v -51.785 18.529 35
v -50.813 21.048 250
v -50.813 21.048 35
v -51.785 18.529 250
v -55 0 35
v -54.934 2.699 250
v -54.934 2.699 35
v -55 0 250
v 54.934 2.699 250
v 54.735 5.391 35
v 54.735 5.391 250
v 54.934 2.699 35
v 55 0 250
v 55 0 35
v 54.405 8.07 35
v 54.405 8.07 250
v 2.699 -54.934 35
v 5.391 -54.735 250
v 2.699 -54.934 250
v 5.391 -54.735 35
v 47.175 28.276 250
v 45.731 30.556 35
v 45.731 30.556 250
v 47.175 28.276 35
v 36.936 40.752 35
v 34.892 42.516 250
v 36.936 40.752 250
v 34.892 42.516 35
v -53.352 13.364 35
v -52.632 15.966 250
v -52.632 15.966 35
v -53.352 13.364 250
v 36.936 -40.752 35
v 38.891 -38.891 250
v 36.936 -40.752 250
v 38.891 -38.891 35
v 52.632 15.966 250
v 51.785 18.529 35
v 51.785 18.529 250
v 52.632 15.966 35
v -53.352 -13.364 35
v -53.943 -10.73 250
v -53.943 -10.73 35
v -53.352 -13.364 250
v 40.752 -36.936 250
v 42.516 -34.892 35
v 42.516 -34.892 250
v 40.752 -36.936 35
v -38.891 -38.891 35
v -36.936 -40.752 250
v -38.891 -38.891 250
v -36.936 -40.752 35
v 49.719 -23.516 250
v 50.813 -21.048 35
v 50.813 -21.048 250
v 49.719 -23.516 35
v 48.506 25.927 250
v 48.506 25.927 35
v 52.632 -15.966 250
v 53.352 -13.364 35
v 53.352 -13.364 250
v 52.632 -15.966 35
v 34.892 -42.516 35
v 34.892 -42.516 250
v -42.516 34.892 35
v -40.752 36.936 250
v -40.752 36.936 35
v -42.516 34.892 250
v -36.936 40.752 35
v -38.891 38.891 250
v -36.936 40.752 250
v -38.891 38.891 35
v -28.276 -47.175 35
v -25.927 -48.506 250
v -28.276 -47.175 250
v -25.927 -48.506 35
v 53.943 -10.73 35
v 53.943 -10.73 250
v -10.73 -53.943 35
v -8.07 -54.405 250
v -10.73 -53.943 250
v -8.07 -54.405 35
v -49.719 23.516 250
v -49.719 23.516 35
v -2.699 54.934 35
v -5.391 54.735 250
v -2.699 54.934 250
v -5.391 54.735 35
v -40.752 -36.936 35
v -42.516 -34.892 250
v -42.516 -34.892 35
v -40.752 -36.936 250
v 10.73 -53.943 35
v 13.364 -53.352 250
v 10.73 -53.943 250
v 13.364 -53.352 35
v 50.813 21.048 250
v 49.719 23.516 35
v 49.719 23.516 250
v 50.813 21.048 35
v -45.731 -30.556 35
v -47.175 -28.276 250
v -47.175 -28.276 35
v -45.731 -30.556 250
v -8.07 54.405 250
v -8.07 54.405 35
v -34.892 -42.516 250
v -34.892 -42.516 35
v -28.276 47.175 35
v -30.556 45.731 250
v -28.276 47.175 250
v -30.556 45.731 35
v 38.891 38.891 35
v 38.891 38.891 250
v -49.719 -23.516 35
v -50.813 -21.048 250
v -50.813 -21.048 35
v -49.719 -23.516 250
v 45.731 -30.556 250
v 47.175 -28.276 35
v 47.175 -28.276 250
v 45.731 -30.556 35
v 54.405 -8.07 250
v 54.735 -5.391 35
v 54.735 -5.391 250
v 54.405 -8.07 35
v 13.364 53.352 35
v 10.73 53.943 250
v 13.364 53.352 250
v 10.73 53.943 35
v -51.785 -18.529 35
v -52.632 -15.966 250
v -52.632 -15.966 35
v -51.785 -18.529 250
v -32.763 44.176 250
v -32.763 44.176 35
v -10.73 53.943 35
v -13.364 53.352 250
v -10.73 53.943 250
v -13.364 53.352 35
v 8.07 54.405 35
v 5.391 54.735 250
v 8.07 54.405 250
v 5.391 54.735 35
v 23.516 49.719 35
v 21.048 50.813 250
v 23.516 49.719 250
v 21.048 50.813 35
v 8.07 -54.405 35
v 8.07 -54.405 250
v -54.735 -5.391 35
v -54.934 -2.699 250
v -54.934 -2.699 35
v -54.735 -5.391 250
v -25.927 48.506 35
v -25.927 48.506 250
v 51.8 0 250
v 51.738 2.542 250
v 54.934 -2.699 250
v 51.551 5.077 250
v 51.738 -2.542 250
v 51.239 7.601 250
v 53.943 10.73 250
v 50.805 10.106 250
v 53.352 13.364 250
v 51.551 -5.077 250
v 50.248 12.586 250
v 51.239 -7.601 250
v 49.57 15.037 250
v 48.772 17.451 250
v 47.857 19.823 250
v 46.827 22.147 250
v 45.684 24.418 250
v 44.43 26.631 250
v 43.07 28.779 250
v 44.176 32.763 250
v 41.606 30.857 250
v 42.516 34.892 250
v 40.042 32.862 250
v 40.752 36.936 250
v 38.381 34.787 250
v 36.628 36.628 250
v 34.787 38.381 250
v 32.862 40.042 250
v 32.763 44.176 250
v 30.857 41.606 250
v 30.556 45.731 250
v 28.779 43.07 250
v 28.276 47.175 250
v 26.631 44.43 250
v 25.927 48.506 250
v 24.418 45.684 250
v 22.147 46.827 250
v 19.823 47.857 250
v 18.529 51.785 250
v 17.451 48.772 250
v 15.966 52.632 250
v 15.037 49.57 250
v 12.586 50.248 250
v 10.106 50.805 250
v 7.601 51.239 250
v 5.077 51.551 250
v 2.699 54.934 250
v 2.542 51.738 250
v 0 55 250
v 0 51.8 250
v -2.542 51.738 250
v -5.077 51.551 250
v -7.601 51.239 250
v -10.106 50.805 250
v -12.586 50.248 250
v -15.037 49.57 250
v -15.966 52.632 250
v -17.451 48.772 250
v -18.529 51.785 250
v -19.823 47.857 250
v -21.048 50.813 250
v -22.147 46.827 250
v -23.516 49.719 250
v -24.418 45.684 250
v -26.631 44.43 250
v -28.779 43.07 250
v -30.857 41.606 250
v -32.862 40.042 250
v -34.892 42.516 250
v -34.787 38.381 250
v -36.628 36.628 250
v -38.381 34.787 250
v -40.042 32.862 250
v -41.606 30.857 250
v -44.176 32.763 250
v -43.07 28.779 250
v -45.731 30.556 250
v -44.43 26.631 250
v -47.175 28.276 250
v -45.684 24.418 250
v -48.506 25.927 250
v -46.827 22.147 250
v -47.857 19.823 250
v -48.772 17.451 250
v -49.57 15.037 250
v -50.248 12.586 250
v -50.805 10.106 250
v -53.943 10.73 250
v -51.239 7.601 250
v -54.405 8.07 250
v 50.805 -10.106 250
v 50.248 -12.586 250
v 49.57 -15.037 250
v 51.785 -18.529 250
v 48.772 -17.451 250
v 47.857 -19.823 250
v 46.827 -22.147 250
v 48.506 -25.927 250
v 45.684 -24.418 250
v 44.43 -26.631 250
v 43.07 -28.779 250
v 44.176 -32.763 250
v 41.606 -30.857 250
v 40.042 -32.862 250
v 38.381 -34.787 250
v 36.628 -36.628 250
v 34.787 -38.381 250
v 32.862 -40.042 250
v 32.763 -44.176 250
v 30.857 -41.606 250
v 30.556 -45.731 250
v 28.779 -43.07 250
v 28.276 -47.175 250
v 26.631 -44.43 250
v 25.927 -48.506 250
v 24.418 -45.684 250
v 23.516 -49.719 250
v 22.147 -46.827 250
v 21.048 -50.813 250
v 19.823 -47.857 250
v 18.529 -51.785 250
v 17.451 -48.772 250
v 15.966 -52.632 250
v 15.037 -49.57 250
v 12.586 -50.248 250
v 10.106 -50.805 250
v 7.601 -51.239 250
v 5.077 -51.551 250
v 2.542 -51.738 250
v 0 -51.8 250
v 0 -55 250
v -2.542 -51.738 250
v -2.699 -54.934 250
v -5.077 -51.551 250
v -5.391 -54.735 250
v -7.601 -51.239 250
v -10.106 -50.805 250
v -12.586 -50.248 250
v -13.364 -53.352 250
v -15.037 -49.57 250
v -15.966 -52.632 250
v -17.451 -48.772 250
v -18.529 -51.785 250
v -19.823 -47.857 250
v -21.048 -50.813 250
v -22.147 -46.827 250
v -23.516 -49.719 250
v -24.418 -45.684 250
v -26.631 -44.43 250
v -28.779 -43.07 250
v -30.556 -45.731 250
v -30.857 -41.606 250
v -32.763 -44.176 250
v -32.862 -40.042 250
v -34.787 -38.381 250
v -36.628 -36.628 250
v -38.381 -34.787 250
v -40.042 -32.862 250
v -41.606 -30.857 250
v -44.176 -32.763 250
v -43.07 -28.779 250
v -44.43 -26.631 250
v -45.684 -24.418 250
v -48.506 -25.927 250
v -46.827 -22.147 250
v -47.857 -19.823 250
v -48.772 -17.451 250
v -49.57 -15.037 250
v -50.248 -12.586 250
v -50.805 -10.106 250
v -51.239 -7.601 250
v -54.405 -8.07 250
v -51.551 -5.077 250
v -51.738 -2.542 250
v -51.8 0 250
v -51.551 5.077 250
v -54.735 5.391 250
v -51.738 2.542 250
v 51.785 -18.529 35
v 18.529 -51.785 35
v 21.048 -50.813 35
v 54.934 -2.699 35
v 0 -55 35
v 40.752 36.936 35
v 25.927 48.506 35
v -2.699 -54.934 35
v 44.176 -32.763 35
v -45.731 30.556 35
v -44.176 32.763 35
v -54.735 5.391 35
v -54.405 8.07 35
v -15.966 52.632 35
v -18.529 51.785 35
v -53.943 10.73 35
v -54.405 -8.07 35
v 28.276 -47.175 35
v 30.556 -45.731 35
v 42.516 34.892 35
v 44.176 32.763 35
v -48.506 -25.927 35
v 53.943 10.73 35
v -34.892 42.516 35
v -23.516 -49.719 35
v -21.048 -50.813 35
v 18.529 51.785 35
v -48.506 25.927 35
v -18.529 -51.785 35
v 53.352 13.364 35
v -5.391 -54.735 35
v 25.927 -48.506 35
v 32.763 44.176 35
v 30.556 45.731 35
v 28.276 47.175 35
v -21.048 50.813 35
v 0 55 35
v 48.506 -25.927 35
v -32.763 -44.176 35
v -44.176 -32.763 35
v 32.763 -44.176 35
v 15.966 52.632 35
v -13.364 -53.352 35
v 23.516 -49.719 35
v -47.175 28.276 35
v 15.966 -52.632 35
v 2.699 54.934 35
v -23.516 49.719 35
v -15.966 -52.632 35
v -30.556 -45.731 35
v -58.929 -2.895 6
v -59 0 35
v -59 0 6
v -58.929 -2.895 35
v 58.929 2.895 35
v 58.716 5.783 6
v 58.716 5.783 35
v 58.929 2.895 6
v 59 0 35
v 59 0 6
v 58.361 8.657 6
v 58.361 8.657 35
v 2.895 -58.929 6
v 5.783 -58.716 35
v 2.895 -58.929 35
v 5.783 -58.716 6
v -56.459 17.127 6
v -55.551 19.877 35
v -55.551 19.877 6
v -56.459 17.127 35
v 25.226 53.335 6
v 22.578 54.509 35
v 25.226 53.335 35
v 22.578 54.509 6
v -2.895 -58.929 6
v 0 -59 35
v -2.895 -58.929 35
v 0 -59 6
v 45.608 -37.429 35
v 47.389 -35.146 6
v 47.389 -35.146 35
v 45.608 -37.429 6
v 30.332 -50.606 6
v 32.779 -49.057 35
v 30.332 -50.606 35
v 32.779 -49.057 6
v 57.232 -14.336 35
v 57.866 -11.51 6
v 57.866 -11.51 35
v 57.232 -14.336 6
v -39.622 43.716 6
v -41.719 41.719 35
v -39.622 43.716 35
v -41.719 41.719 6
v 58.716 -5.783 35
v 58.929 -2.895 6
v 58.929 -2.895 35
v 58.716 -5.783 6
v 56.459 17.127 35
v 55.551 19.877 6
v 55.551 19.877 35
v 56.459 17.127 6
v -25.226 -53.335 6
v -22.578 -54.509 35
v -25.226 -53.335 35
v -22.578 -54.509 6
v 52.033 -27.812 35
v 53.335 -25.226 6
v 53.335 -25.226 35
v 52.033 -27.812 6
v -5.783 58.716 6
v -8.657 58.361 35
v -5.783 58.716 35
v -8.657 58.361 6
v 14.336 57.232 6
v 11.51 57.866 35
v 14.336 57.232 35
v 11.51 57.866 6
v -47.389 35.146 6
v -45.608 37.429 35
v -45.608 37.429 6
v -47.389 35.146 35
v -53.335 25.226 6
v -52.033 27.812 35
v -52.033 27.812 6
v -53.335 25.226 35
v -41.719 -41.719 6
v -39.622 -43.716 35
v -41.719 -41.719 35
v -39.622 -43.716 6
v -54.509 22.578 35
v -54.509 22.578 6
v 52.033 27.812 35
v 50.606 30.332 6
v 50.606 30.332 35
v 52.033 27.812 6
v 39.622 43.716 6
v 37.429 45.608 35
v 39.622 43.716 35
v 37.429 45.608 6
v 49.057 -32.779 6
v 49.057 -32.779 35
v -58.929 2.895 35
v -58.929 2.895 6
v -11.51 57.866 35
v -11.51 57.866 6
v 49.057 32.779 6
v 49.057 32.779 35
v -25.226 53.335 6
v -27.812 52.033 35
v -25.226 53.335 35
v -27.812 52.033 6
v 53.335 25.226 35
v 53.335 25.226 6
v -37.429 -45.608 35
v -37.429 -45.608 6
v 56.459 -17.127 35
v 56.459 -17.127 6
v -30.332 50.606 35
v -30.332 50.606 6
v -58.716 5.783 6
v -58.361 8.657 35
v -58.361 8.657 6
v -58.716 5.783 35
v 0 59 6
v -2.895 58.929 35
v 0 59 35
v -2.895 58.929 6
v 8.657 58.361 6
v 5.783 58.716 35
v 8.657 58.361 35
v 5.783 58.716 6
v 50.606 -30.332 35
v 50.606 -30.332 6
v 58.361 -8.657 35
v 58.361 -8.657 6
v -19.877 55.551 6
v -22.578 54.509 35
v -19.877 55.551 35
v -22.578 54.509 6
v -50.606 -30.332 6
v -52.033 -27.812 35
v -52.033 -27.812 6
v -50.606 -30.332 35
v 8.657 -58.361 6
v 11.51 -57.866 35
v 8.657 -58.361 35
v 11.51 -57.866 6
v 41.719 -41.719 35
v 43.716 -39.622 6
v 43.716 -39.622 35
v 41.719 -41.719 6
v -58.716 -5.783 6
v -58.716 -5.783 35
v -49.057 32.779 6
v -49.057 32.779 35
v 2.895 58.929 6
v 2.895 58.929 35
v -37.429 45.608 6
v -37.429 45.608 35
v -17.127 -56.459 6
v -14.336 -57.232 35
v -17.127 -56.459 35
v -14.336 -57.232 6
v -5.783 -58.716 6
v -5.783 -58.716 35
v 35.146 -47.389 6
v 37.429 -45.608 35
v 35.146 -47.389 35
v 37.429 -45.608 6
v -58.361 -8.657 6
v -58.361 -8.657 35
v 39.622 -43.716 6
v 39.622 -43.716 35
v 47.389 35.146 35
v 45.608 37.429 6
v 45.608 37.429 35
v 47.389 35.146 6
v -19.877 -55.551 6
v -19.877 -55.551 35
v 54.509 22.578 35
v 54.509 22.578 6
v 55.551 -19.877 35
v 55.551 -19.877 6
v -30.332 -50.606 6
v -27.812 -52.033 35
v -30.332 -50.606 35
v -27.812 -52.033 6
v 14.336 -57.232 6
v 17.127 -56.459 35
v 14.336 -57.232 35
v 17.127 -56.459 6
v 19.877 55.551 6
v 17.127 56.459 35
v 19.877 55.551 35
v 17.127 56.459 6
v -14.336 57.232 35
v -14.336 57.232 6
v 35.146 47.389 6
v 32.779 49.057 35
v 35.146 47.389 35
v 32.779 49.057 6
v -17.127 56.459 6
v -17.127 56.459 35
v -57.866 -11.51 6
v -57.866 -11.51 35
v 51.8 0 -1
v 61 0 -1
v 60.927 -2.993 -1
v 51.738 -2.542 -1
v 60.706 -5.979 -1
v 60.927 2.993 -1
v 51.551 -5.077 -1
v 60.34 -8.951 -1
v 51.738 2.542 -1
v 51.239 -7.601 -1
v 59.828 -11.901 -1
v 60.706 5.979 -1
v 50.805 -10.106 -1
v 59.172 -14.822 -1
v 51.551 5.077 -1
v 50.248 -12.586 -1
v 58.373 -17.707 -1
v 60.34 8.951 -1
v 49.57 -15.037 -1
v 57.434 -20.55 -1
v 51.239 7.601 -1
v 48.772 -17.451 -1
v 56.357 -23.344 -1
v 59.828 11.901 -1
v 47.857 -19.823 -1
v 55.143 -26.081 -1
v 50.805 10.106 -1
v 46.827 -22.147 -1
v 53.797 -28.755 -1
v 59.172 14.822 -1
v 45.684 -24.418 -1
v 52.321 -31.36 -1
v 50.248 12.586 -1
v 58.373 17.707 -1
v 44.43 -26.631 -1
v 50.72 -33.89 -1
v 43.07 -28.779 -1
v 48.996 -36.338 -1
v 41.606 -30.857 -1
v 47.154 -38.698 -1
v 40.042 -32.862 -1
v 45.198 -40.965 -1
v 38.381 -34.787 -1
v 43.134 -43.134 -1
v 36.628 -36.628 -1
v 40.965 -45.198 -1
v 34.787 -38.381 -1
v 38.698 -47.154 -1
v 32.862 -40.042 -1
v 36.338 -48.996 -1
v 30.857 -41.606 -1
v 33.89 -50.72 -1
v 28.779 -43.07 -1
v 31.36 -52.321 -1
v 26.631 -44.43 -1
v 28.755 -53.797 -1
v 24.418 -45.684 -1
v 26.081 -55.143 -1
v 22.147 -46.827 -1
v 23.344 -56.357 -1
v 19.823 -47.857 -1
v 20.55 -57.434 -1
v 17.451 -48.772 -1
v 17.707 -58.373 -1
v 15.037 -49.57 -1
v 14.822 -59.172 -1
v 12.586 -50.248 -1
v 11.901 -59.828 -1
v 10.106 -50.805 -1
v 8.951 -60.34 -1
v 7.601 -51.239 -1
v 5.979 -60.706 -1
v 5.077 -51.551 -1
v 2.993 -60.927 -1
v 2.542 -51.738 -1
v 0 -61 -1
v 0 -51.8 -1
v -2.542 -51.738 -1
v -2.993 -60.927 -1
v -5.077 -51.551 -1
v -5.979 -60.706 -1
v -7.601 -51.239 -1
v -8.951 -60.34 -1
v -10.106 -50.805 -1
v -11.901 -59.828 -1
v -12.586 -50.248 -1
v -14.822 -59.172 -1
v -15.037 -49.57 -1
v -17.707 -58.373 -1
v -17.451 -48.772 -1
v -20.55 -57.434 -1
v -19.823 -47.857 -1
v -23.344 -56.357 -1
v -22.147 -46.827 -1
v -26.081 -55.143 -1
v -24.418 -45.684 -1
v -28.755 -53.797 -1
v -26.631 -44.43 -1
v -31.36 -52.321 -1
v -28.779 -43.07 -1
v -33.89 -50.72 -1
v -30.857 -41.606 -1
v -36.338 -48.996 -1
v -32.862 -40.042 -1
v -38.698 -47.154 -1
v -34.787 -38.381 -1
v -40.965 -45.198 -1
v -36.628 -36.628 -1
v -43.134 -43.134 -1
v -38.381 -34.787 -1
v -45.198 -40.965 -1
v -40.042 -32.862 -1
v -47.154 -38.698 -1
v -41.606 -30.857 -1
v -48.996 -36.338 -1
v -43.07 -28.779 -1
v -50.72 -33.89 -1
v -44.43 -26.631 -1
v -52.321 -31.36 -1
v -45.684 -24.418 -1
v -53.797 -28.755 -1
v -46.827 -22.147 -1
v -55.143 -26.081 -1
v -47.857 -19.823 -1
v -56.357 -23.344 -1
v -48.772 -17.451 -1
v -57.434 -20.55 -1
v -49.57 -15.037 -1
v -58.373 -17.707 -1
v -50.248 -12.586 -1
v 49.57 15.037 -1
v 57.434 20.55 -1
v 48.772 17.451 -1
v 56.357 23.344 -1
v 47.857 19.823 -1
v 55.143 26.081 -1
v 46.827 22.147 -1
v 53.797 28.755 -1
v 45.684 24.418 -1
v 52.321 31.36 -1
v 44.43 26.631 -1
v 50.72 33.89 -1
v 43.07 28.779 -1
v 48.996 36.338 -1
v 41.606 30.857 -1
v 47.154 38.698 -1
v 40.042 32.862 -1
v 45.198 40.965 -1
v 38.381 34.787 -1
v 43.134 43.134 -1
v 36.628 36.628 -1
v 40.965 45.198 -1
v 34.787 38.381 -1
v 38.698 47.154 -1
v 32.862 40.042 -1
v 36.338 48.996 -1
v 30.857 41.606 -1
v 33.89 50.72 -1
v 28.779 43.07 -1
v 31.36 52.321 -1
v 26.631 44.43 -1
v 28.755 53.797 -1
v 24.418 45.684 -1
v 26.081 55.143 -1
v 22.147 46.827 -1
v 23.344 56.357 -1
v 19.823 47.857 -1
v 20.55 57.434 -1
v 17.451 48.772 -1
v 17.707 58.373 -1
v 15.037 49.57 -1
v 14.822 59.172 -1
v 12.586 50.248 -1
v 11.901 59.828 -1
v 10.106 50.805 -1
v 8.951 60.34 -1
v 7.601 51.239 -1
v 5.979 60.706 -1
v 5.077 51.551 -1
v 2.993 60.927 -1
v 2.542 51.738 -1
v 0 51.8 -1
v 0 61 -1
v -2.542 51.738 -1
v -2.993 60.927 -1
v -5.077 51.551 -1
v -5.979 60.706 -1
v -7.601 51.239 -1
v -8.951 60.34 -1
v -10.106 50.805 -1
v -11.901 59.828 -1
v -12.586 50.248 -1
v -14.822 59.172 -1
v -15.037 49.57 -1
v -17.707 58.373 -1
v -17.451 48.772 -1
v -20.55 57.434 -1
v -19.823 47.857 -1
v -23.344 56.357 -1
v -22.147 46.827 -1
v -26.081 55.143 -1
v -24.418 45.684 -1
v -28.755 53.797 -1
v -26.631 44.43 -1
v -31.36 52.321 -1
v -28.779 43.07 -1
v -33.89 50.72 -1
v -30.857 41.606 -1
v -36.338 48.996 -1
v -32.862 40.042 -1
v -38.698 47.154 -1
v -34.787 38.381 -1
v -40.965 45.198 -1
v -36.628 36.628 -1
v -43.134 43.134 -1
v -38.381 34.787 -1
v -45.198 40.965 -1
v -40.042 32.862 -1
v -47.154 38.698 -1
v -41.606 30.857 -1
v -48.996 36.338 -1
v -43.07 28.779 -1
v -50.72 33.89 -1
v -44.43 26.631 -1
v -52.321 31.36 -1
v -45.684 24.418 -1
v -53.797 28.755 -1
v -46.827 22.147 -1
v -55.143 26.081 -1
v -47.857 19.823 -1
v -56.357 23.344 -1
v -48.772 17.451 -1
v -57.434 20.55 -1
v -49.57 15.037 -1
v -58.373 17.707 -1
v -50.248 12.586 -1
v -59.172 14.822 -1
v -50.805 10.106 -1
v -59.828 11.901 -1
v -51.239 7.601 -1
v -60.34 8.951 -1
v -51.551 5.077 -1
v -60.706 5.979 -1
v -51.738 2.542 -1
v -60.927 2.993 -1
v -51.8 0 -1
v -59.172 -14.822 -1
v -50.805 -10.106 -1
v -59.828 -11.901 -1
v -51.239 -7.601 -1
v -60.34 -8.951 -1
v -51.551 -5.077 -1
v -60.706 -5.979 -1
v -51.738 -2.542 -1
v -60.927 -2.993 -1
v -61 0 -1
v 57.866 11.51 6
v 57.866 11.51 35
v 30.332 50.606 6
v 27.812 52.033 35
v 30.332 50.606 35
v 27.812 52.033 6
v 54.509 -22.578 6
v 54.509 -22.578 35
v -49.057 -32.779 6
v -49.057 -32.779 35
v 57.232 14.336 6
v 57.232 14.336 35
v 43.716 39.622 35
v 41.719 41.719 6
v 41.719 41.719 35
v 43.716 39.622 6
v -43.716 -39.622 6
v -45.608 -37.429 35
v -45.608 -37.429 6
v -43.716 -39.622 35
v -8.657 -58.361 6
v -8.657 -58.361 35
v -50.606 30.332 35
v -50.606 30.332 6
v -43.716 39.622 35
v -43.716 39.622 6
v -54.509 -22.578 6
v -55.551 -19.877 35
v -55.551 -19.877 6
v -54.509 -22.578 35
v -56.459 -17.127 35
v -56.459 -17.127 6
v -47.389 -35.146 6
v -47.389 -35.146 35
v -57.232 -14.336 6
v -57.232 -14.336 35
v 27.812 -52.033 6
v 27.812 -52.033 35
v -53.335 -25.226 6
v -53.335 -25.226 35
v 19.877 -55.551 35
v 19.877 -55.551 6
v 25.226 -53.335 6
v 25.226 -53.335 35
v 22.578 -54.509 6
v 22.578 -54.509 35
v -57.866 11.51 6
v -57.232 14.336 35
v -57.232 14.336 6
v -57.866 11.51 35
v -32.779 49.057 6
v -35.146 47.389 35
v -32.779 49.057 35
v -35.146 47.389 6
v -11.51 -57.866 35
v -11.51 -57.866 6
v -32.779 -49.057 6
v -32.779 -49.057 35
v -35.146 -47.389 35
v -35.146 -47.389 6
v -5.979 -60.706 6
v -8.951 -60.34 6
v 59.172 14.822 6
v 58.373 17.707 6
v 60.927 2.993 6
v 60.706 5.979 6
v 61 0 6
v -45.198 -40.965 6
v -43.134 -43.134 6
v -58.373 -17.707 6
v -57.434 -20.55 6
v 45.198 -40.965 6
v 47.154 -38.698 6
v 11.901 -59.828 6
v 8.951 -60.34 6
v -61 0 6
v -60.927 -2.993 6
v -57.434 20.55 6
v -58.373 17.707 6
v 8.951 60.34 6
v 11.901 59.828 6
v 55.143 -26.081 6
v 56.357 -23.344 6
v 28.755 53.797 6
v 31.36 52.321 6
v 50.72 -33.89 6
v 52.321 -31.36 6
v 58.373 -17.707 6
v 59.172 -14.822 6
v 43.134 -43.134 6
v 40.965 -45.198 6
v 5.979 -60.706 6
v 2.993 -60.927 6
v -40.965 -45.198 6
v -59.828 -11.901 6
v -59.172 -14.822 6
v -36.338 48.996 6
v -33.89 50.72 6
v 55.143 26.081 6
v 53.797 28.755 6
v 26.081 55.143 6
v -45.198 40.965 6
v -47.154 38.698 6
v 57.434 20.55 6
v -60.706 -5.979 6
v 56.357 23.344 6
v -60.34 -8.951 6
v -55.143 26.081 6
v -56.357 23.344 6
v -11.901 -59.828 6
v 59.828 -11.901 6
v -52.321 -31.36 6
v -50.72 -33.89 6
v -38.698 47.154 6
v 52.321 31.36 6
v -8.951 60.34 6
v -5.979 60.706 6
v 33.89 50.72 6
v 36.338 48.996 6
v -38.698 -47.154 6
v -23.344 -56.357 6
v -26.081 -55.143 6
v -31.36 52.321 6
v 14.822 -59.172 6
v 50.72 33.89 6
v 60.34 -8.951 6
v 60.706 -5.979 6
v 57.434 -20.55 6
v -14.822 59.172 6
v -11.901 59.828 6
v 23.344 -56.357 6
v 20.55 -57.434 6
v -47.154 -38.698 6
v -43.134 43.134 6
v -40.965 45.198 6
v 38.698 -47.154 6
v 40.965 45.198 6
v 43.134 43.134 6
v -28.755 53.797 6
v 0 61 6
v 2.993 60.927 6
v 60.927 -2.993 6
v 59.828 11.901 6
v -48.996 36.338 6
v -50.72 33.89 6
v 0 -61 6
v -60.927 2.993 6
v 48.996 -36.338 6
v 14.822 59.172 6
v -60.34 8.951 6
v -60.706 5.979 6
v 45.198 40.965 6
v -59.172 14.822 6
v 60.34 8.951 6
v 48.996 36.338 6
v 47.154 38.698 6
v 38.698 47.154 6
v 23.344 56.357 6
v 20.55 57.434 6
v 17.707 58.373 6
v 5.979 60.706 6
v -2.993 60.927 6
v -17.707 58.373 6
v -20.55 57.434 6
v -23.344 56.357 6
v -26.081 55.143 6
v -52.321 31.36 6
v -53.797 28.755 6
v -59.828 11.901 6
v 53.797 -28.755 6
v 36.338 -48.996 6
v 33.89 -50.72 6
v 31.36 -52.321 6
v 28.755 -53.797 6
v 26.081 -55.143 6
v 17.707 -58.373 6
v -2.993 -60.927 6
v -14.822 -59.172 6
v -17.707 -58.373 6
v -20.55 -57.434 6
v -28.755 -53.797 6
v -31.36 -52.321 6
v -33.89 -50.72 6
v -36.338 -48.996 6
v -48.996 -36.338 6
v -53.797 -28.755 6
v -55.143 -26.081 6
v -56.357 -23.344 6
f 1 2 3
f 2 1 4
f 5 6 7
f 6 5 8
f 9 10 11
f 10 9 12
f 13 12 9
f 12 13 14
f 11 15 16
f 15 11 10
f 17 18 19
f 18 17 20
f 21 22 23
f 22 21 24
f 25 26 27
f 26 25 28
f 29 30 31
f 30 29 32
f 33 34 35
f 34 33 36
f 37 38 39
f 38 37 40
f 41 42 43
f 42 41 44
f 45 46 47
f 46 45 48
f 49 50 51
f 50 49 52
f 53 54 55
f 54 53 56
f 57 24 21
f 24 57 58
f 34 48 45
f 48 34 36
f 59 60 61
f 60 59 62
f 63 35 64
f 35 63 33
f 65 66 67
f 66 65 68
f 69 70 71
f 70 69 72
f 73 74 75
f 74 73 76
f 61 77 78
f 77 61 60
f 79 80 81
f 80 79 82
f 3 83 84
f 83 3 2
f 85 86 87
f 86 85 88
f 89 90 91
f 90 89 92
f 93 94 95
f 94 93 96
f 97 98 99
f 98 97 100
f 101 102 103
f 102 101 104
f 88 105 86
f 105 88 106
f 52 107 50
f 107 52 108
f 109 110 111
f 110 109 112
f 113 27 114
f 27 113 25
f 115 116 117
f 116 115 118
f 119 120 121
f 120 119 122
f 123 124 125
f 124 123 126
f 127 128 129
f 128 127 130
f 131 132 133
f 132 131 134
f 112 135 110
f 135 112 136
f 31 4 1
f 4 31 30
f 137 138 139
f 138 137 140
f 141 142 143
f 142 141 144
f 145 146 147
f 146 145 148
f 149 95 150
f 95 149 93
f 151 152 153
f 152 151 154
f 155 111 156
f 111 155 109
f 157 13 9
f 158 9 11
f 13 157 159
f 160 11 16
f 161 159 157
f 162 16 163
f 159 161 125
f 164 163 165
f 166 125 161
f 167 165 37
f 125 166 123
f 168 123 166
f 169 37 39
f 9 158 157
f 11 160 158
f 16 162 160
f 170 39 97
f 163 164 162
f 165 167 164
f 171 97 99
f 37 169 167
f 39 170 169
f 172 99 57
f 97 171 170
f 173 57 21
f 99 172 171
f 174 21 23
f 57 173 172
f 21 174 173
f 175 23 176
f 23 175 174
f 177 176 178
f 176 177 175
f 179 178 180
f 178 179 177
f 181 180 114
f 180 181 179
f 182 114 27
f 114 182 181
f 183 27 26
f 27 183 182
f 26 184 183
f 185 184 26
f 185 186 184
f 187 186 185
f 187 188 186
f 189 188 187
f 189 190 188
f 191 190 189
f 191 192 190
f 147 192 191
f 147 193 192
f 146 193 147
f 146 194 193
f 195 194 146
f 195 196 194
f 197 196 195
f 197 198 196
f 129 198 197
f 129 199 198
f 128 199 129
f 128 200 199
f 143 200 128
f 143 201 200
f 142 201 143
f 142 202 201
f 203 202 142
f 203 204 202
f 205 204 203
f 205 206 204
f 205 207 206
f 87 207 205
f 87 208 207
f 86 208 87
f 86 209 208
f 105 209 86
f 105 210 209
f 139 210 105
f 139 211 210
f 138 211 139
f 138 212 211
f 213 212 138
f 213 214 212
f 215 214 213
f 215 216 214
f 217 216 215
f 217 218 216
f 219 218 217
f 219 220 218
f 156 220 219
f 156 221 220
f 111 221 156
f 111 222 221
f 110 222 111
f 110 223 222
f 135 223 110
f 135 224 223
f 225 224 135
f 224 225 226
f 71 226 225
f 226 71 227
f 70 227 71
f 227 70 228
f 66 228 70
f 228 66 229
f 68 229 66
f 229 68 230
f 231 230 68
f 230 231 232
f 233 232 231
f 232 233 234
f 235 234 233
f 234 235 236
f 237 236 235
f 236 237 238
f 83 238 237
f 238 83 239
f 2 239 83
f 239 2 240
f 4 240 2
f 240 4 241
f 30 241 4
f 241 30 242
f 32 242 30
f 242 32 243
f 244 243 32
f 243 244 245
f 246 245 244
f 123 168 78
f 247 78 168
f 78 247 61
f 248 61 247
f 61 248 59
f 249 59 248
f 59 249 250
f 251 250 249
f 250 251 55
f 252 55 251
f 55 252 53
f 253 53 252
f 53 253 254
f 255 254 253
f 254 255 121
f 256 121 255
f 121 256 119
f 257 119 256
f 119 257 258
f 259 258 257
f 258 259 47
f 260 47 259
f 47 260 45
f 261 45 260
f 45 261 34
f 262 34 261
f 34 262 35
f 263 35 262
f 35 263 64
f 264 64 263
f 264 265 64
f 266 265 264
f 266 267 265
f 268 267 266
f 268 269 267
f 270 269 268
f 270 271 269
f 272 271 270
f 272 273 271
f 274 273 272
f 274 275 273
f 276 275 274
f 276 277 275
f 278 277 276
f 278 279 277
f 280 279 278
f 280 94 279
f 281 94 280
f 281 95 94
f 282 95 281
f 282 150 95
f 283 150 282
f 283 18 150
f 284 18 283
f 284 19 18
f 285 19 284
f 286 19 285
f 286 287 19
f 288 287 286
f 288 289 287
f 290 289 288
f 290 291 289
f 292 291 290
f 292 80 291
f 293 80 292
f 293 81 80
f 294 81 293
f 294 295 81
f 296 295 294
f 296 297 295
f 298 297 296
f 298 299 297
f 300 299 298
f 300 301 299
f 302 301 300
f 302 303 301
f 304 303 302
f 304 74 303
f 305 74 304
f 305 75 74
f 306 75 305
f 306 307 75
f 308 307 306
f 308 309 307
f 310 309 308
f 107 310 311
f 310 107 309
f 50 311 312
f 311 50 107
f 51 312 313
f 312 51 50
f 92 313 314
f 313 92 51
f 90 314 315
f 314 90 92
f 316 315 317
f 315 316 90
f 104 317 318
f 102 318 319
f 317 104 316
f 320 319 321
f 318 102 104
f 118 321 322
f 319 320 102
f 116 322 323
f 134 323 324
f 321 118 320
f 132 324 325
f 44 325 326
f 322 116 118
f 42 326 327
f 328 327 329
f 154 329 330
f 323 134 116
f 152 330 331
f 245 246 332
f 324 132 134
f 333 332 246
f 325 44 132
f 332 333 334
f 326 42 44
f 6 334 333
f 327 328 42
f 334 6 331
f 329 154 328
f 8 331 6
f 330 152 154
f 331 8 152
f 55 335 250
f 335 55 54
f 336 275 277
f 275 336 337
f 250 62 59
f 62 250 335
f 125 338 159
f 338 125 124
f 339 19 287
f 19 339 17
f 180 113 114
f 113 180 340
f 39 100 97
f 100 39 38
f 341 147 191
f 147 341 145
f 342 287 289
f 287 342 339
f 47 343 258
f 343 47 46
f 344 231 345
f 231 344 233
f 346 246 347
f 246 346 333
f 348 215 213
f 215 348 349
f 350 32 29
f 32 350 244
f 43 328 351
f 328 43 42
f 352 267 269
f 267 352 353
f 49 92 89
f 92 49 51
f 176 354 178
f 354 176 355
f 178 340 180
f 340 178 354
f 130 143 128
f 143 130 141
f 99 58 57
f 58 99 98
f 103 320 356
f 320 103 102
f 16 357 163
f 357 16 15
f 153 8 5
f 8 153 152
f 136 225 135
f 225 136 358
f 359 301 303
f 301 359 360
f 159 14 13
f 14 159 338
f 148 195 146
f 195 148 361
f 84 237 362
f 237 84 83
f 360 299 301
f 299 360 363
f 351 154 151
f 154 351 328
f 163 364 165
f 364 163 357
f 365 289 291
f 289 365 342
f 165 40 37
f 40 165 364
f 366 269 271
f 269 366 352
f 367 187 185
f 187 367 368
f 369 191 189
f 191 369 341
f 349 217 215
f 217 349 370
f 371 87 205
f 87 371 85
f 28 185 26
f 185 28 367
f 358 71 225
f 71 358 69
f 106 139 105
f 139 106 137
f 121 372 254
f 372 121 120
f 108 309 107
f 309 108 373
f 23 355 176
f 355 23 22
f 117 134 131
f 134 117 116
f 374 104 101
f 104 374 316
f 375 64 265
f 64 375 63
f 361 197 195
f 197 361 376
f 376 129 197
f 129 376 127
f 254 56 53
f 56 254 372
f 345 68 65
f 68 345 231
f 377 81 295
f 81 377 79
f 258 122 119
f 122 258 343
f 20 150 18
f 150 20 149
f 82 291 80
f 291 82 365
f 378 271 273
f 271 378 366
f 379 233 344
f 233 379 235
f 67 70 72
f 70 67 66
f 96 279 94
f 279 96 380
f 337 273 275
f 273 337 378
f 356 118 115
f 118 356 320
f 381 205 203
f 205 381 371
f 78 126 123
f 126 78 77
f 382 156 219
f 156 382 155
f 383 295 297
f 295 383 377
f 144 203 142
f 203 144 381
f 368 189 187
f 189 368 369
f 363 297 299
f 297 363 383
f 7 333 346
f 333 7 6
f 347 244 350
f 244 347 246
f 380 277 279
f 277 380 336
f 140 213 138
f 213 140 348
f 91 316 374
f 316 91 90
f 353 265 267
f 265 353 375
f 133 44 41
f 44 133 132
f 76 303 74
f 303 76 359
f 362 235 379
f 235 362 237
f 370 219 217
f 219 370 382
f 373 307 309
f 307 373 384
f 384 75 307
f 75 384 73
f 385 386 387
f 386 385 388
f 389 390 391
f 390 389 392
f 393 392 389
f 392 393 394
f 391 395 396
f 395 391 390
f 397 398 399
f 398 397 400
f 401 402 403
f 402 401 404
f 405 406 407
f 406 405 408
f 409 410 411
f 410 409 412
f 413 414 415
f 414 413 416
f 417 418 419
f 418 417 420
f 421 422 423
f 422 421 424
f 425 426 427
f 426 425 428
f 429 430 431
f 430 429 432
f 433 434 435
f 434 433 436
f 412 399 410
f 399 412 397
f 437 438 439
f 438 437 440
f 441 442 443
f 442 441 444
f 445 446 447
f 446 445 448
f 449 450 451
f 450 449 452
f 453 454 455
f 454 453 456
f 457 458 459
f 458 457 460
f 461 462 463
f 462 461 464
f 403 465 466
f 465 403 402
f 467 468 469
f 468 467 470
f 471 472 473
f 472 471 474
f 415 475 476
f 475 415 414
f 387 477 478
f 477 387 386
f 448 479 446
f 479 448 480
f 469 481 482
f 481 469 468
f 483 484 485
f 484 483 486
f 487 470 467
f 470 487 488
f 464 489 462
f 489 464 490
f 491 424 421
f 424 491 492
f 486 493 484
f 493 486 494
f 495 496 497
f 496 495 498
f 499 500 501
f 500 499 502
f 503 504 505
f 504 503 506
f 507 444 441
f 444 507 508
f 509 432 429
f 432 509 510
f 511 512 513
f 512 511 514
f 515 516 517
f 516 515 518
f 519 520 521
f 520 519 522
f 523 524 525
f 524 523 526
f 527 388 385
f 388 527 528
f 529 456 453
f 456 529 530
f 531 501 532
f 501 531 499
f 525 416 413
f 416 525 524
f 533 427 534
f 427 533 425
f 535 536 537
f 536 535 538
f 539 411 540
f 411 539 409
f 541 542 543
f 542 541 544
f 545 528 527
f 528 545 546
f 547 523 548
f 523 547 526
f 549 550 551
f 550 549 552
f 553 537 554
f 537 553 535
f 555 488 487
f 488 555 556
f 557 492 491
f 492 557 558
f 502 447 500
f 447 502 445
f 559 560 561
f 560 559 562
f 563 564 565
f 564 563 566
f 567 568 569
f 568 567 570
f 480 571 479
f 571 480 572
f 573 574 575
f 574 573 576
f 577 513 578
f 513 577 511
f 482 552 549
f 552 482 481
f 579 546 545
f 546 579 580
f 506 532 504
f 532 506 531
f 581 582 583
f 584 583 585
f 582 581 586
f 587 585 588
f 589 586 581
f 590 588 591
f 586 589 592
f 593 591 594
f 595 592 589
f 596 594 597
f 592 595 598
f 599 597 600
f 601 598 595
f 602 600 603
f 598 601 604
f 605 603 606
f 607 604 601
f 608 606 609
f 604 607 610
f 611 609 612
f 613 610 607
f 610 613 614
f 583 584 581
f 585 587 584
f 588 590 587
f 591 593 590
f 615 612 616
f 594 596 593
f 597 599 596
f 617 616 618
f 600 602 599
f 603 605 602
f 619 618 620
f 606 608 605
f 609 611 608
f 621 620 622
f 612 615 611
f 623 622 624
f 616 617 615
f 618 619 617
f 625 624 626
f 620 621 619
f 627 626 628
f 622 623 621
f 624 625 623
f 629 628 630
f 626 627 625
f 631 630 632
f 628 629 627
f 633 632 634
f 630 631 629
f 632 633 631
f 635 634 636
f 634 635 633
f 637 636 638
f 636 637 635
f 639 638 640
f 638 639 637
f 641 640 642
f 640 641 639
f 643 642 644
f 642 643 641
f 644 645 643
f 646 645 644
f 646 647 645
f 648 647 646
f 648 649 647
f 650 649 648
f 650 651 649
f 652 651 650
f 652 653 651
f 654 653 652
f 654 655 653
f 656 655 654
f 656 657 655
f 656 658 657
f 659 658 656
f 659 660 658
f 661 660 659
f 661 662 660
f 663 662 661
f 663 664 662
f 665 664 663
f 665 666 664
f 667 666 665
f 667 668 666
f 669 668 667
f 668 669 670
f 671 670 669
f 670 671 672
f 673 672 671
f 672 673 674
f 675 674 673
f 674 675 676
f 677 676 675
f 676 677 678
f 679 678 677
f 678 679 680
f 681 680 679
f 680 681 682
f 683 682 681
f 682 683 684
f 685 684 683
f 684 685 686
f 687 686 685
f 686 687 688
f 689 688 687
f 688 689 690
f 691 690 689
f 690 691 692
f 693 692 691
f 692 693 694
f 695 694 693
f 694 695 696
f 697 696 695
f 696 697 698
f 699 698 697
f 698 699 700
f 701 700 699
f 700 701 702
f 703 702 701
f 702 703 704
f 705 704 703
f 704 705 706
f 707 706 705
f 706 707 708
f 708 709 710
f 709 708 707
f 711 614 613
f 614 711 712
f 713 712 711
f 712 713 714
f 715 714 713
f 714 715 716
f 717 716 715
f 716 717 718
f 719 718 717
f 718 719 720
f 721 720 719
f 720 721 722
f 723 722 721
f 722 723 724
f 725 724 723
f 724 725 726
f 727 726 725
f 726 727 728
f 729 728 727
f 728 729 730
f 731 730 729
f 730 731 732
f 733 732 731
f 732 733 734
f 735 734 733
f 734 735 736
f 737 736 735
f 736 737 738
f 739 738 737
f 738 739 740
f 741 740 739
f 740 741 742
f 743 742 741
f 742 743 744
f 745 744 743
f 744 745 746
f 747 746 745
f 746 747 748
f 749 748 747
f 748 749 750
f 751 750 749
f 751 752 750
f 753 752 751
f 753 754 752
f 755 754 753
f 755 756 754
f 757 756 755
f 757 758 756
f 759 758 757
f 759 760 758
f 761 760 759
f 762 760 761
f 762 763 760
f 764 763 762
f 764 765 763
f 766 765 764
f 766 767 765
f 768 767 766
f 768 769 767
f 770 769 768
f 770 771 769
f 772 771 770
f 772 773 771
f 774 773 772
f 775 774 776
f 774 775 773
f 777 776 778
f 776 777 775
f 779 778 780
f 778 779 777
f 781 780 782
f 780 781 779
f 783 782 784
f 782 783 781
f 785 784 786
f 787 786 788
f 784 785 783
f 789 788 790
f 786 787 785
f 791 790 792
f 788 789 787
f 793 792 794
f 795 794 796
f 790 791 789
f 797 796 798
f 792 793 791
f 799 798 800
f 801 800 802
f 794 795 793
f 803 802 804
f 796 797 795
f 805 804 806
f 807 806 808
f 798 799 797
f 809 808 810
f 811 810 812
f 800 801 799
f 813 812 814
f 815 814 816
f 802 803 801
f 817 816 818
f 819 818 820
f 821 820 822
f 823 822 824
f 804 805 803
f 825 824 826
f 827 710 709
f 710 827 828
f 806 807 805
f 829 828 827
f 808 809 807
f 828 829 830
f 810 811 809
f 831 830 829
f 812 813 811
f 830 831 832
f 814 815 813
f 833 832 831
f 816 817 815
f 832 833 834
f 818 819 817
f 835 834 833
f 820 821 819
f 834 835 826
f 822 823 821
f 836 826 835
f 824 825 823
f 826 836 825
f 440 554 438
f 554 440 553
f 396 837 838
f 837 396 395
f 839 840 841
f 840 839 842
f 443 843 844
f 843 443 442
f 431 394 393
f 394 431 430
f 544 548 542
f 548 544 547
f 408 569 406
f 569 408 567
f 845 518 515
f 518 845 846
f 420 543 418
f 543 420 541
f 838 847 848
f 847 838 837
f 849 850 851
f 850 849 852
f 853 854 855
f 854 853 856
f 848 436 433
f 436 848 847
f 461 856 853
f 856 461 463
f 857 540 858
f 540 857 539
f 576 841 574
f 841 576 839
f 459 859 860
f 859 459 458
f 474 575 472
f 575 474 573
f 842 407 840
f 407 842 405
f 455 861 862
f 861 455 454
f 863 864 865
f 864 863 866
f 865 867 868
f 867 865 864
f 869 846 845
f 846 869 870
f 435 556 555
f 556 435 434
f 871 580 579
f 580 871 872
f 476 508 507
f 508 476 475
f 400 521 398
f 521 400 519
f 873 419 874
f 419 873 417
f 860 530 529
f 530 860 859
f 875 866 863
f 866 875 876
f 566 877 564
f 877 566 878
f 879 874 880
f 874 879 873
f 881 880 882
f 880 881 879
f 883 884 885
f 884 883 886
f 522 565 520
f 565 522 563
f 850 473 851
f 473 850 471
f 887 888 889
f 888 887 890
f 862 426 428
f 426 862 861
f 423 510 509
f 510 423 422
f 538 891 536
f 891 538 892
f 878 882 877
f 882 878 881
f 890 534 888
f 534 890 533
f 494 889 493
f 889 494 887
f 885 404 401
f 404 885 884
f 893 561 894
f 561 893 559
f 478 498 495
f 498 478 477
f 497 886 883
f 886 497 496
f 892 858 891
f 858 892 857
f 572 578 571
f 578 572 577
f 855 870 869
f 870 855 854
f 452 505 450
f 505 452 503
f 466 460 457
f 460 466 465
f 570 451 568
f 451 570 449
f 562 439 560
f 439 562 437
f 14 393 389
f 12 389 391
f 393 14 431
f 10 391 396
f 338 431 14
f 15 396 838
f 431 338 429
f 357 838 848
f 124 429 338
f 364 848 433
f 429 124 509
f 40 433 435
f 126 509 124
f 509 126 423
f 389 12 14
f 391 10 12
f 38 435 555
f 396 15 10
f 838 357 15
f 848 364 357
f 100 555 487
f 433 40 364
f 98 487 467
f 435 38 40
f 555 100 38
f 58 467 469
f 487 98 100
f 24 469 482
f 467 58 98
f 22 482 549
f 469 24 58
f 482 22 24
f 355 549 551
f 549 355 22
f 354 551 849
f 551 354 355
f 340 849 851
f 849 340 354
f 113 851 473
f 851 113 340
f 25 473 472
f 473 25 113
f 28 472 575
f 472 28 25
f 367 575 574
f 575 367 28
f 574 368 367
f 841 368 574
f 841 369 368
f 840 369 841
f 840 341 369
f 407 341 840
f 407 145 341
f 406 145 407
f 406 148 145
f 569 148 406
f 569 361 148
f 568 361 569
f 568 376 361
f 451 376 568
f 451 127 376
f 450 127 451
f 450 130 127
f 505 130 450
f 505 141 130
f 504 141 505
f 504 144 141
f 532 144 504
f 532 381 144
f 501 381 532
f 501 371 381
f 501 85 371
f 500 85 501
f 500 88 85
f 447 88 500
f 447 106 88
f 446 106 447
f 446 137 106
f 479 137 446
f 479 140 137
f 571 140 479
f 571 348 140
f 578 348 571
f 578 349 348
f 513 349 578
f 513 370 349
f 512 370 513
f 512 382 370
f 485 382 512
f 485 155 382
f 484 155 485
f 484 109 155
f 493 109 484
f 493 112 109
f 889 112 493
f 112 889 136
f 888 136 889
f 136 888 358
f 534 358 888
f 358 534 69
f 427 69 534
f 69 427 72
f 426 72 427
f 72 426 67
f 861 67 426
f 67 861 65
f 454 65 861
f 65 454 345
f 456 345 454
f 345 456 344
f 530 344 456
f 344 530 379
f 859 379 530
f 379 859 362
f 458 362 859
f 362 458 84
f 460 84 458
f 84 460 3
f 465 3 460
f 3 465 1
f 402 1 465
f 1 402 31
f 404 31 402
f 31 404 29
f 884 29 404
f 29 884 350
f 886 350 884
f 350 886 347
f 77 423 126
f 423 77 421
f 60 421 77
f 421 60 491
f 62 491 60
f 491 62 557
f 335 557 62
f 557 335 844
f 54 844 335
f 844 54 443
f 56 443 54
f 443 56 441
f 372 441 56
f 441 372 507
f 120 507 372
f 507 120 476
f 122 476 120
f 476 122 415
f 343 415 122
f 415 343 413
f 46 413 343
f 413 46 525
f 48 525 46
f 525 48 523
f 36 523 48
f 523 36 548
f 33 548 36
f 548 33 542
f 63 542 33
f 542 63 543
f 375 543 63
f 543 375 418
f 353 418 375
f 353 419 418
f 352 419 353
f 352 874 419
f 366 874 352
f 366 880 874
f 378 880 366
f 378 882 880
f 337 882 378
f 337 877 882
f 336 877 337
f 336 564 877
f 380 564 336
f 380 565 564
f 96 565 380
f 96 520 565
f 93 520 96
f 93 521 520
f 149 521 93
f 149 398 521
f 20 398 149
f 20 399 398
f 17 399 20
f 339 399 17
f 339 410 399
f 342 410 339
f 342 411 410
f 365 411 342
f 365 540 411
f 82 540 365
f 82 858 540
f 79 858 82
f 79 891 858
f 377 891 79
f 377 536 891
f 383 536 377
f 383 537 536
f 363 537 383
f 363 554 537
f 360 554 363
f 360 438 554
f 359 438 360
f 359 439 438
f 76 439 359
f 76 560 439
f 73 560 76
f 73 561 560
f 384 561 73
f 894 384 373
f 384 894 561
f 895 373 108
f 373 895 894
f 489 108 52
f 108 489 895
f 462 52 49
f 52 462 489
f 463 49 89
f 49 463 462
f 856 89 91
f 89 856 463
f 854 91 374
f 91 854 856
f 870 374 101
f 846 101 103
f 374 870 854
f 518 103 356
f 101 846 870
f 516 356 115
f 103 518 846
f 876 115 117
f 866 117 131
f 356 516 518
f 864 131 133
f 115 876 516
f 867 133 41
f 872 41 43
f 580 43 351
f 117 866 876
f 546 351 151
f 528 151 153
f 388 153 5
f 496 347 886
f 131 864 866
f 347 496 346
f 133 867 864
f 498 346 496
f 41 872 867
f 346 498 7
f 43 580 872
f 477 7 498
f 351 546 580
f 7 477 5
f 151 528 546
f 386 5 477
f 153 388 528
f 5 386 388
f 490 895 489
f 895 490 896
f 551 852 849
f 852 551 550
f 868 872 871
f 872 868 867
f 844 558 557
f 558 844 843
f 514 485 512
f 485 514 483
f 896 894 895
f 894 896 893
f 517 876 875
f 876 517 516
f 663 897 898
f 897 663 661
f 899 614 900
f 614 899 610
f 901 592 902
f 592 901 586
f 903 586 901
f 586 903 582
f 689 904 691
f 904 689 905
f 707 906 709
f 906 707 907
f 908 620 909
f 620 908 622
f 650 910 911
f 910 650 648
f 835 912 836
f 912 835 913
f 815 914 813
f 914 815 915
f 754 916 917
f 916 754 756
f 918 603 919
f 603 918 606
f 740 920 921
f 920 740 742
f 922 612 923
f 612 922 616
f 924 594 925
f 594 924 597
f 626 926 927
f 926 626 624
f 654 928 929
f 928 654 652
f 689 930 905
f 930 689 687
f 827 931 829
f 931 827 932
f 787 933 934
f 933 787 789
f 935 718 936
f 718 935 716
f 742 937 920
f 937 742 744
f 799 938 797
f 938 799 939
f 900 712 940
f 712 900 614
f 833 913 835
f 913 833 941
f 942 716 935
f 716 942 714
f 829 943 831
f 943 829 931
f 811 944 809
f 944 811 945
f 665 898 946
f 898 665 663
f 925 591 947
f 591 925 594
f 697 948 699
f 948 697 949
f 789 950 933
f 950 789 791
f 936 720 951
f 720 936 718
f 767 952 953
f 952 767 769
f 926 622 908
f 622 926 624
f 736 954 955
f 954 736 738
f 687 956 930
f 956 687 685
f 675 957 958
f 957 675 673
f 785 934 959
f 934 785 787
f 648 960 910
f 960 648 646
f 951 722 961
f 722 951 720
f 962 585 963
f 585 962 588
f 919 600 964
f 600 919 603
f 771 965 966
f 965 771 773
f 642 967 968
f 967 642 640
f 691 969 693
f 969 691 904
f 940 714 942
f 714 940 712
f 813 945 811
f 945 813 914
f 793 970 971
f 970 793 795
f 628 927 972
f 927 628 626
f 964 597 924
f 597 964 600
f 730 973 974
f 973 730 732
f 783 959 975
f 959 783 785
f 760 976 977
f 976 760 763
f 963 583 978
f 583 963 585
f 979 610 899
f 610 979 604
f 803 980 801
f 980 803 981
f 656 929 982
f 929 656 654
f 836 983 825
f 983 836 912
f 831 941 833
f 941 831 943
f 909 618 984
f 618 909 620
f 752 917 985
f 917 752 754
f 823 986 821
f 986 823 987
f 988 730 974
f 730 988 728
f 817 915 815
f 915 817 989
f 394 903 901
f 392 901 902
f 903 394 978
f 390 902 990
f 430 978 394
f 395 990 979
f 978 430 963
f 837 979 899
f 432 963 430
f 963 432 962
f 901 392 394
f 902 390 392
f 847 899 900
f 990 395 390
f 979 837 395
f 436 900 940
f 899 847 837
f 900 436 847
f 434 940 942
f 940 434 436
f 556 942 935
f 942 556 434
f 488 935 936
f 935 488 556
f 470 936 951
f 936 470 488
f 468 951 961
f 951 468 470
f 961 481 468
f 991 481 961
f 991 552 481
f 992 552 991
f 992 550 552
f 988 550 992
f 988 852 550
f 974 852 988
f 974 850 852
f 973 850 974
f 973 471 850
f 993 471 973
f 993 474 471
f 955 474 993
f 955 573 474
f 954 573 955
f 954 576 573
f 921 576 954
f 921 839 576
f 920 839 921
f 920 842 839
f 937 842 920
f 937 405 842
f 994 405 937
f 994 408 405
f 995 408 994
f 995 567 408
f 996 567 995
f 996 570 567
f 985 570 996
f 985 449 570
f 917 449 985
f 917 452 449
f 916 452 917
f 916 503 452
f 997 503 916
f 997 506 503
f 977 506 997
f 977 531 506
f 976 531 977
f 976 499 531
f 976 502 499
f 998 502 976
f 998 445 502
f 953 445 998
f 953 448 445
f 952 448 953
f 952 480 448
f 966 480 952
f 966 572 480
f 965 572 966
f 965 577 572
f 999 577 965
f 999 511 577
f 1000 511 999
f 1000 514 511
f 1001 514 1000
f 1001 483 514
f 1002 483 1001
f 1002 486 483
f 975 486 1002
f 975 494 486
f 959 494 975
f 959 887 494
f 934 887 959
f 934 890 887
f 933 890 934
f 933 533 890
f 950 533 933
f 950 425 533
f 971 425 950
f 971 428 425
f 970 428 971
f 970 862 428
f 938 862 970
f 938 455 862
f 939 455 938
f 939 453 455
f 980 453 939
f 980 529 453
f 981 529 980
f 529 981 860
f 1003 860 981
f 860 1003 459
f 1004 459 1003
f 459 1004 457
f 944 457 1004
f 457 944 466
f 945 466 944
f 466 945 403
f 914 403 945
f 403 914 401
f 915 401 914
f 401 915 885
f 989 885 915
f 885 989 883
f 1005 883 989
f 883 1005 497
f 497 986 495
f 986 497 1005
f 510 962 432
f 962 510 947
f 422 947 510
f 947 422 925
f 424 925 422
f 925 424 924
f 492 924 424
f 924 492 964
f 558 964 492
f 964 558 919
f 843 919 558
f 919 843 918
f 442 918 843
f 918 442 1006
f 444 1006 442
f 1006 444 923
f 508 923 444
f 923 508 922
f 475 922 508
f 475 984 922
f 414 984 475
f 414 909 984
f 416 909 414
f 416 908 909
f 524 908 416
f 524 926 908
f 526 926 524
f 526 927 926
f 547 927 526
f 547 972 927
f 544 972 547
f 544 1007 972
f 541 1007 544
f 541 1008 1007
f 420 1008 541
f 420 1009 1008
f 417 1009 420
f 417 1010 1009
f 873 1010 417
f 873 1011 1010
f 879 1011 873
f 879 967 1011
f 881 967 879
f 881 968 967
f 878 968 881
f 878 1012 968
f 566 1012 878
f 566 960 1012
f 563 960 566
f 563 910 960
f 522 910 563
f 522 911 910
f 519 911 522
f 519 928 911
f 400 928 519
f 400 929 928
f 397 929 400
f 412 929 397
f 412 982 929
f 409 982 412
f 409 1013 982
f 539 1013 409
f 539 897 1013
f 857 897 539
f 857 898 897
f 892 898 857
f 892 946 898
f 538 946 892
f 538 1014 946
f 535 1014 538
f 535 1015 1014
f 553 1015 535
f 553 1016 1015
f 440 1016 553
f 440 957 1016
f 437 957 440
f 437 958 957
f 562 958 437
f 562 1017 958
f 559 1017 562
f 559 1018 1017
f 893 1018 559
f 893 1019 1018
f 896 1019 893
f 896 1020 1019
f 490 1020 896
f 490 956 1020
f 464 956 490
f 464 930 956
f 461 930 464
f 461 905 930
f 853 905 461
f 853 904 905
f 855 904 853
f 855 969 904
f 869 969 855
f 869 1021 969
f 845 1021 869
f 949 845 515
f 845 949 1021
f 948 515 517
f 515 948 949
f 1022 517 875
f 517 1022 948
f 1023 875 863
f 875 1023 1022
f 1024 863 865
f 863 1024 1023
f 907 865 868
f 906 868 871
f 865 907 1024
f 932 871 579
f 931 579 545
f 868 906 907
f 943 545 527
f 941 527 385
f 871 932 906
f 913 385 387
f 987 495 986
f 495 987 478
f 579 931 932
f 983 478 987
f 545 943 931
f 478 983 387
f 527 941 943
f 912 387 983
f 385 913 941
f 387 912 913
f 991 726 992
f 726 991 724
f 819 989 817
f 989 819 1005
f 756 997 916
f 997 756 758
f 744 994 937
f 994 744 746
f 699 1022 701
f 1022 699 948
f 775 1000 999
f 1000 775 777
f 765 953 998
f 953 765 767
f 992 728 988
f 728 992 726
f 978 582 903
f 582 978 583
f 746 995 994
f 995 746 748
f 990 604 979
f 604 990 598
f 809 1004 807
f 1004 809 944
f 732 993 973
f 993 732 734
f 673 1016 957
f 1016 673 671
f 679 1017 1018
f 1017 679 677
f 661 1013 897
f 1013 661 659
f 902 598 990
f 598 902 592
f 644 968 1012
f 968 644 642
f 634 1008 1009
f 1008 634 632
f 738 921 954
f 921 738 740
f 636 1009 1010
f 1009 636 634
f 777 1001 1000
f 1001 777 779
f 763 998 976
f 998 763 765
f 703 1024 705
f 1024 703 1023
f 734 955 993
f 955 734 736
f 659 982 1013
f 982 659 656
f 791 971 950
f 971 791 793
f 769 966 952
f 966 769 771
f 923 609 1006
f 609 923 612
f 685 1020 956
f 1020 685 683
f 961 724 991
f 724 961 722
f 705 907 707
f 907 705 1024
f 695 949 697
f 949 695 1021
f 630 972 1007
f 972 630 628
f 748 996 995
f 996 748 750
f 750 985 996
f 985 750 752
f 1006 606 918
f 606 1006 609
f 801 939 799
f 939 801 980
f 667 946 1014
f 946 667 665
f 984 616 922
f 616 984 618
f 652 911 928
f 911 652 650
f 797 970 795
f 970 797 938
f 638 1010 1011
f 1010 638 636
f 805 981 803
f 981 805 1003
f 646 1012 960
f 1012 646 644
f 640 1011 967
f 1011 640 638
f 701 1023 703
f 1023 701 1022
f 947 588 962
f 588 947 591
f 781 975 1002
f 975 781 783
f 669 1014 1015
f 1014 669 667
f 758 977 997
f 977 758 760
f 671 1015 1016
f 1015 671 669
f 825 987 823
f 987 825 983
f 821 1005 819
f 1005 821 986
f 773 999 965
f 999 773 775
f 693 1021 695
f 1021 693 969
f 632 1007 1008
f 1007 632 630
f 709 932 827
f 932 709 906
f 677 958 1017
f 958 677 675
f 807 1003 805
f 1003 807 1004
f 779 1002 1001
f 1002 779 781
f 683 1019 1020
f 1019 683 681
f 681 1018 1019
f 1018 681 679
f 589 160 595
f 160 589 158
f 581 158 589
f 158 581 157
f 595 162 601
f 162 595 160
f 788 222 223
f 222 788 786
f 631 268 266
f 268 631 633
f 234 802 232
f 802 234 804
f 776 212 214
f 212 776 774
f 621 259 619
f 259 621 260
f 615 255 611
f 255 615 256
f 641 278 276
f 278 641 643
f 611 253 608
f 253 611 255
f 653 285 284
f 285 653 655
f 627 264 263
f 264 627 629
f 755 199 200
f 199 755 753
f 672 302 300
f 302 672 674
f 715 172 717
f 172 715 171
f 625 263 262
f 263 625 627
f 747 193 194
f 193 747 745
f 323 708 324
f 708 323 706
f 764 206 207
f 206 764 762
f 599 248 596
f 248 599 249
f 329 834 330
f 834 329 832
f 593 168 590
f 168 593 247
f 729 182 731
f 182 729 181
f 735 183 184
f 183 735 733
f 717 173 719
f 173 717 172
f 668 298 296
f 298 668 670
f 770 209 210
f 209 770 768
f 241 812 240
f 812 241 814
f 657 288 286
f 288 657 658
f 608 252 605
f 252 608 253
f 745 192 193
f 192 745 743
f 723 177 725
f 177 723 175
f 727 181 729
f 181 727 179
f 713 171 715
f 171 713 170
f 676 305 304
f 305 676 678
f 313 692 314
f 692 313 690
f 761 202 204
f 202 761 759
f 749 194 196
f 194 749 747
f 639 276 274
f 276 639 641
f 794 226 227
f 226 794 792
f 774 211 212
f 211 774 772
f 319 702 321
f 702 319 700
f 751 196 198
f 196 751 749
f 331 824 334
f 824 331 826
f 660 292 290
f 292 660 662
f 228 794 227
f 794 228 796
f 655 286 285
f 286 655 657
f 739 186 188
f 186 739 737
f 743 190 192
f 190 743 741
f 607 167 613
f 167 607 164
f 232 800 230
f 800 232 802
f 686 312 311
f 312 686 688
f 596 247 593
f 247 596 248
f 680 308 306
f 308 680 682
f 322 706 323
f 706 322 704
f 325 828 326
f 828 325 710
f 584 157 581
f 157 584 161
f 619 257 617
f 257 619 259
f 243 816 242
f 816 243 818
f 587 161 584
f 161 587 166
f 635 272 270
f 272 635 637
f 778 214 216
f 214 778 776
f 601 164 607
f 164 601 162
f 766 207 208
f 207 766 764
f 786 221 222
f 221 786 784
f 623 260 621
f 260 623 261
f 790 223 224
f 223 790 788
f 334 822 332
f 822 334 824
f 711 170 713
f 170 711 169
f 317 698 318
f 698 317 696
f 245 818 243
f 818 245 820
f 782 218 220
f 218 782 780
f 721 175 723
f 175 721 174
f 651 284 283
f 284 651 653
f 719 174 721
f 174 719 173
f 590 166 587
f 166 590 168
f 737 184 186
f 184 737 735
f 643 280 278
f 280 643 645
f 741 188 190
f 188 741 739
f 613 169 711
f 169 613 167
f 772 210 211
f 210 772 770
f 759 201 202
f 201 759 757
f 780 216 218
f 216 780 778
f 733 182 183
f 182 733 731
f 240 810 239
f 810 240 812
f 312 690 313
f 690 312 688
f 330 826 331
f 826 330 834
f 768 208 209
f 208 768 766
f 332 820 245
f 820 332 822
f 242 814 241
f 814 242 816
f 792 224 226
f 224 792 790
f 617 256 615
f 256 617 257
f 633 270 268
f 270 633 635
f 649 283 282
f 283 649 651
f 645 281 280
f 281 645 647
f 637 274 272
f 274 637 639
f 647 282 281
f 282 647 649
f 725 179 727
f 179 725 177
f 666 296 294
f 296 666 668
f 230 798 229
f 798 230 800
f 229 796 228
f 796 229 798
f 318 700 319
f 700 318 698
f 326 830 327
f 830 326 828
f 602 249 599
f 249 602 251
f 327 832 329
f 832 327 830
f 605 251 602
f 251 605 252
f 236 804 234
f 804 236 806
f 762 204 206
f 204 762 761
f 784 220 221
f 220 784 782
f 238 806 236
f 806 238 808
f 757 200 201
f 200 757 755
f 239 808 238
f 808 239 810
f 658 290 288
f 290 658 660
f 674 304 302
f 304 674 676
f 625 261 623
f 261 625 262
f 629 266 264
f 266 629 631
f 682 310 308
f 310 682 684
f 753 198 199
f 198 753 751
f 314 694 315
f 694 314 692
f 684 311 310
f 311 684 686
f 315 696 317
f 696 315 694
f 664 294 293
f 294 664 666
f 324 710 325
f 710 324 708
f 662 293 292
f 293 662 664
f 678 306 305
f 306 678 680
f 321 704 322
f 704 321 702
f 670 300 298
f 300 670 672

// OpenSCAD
// HT 110 pipe, length 250 mm (single connected solid)

// Parameters
nominal_diameter_mm = 110; //[55:220:1]
length_mm = 250; //[125:500:1]
wall_thickness_mm = 3.2; //[1.6:6.4:0.1]
fitting_length_mm = 35; //[18:70:1]
fitting_radial_increase_mm = 4; //[2:10:0.5]
fitting_wall_extra_mm = 1.2; //[0.6:3:0.1]
fitting_stop_ring_length_mm = 6; //[3:15:0.5]
fitting_stop_ring_radial_mm = 2; //[1:6:0.5]
overlap_mm = 1; //[0.5:2:0.1]

$fn = 128;

module ht_pipe() {
    r_outer = nominal_diameter_mm/2;
    r_inner = r_outer - wall_thickness_mm;

    // Sleeve (socket) radii
    r_sleeve_outer = r_outer + fitting_radial_increase_mm;
    r_sleeve_inner = r_outer - (wall_thickness_mm + fitting_wall_extra_mm);

    // Stop ring radius
    r_ring_outer = r_sleeve_outer + fitting_stop_ring_radial_mm;

    // Axial placement: socket at z=0 end (matches reference views)
    z_pipe0   = 0;
    z_pipe1   = length_mm;

    z_sleeve0 = z_pipe0;
    z_sleeve1 = z_pipe0 + fitting_length_mm;

    z_ring0   = z_pipe0;
    z_ring1   = z_pipe0 + fitting_stop_ring_length_mm;

    // Validations
    assert(length_mm > 0, "length_mm must be > 0");
    assert(wall_thickness_mm > 0, "wall_thickness_mm must be > 0");
    assert(r_inner > 0, "wall_thickness_mm too large for nominal_diameter_mm");
    assert(r_sleeve_inner > 0, "fitting_wall_extra_mm too large");
    assert(r_sleeve_inner < r_sleeve_outer, "Sleeve inner radius must be smaller than sleeve outer radius");
    assert(fitting_length_mm >= fitting_stop_ring_length_mm, "Stop ring length must be <= fitting length");

    color([0.85, 0.85, 0.8])
    difference() {
        // OUTER SOLID (connected via overlaps)
        union() {
            // Main outer cylinder
            cylinder(r=r_outer, h=length_mm, center=false);

            // End fitting sleeve at z=0 end, overlapping into main
            translate([0, 0, z_sleeve0 - overlap_mm])
                cylinder(r=r_sleeve_outer, h=fitting_length_mm + overlap_mm, center=false);

            // Stop ring at very end, overlapping into sleeve
            translate([0, 0, z_ring0 - overlap_mm])
                cylinder(r=r_ring_outer, h=fitting_stop_ring_length_mm + overlap_mm, center=false);
        }

        // INNER VOID (single connected cavity)
        union() {
            // Main pipe bore (extended for clean subtraction)
            translate([0, 0, z_pipe0 - 2*overlap_mm])
                cylinder(r=r_inner, h=length_mm + 4*overlap_mm, center=false);

            // Sleeve bore (slightly larger, opens at z=0 end)
            translate([0, 0, z_sleeve0 - 2*overlap_mm])
                cylinder(r=r_sleeve_inner, h=fitting_length_mm + 4*overlap_mm, center=false);
        }
    }
}

ht_pipe();
